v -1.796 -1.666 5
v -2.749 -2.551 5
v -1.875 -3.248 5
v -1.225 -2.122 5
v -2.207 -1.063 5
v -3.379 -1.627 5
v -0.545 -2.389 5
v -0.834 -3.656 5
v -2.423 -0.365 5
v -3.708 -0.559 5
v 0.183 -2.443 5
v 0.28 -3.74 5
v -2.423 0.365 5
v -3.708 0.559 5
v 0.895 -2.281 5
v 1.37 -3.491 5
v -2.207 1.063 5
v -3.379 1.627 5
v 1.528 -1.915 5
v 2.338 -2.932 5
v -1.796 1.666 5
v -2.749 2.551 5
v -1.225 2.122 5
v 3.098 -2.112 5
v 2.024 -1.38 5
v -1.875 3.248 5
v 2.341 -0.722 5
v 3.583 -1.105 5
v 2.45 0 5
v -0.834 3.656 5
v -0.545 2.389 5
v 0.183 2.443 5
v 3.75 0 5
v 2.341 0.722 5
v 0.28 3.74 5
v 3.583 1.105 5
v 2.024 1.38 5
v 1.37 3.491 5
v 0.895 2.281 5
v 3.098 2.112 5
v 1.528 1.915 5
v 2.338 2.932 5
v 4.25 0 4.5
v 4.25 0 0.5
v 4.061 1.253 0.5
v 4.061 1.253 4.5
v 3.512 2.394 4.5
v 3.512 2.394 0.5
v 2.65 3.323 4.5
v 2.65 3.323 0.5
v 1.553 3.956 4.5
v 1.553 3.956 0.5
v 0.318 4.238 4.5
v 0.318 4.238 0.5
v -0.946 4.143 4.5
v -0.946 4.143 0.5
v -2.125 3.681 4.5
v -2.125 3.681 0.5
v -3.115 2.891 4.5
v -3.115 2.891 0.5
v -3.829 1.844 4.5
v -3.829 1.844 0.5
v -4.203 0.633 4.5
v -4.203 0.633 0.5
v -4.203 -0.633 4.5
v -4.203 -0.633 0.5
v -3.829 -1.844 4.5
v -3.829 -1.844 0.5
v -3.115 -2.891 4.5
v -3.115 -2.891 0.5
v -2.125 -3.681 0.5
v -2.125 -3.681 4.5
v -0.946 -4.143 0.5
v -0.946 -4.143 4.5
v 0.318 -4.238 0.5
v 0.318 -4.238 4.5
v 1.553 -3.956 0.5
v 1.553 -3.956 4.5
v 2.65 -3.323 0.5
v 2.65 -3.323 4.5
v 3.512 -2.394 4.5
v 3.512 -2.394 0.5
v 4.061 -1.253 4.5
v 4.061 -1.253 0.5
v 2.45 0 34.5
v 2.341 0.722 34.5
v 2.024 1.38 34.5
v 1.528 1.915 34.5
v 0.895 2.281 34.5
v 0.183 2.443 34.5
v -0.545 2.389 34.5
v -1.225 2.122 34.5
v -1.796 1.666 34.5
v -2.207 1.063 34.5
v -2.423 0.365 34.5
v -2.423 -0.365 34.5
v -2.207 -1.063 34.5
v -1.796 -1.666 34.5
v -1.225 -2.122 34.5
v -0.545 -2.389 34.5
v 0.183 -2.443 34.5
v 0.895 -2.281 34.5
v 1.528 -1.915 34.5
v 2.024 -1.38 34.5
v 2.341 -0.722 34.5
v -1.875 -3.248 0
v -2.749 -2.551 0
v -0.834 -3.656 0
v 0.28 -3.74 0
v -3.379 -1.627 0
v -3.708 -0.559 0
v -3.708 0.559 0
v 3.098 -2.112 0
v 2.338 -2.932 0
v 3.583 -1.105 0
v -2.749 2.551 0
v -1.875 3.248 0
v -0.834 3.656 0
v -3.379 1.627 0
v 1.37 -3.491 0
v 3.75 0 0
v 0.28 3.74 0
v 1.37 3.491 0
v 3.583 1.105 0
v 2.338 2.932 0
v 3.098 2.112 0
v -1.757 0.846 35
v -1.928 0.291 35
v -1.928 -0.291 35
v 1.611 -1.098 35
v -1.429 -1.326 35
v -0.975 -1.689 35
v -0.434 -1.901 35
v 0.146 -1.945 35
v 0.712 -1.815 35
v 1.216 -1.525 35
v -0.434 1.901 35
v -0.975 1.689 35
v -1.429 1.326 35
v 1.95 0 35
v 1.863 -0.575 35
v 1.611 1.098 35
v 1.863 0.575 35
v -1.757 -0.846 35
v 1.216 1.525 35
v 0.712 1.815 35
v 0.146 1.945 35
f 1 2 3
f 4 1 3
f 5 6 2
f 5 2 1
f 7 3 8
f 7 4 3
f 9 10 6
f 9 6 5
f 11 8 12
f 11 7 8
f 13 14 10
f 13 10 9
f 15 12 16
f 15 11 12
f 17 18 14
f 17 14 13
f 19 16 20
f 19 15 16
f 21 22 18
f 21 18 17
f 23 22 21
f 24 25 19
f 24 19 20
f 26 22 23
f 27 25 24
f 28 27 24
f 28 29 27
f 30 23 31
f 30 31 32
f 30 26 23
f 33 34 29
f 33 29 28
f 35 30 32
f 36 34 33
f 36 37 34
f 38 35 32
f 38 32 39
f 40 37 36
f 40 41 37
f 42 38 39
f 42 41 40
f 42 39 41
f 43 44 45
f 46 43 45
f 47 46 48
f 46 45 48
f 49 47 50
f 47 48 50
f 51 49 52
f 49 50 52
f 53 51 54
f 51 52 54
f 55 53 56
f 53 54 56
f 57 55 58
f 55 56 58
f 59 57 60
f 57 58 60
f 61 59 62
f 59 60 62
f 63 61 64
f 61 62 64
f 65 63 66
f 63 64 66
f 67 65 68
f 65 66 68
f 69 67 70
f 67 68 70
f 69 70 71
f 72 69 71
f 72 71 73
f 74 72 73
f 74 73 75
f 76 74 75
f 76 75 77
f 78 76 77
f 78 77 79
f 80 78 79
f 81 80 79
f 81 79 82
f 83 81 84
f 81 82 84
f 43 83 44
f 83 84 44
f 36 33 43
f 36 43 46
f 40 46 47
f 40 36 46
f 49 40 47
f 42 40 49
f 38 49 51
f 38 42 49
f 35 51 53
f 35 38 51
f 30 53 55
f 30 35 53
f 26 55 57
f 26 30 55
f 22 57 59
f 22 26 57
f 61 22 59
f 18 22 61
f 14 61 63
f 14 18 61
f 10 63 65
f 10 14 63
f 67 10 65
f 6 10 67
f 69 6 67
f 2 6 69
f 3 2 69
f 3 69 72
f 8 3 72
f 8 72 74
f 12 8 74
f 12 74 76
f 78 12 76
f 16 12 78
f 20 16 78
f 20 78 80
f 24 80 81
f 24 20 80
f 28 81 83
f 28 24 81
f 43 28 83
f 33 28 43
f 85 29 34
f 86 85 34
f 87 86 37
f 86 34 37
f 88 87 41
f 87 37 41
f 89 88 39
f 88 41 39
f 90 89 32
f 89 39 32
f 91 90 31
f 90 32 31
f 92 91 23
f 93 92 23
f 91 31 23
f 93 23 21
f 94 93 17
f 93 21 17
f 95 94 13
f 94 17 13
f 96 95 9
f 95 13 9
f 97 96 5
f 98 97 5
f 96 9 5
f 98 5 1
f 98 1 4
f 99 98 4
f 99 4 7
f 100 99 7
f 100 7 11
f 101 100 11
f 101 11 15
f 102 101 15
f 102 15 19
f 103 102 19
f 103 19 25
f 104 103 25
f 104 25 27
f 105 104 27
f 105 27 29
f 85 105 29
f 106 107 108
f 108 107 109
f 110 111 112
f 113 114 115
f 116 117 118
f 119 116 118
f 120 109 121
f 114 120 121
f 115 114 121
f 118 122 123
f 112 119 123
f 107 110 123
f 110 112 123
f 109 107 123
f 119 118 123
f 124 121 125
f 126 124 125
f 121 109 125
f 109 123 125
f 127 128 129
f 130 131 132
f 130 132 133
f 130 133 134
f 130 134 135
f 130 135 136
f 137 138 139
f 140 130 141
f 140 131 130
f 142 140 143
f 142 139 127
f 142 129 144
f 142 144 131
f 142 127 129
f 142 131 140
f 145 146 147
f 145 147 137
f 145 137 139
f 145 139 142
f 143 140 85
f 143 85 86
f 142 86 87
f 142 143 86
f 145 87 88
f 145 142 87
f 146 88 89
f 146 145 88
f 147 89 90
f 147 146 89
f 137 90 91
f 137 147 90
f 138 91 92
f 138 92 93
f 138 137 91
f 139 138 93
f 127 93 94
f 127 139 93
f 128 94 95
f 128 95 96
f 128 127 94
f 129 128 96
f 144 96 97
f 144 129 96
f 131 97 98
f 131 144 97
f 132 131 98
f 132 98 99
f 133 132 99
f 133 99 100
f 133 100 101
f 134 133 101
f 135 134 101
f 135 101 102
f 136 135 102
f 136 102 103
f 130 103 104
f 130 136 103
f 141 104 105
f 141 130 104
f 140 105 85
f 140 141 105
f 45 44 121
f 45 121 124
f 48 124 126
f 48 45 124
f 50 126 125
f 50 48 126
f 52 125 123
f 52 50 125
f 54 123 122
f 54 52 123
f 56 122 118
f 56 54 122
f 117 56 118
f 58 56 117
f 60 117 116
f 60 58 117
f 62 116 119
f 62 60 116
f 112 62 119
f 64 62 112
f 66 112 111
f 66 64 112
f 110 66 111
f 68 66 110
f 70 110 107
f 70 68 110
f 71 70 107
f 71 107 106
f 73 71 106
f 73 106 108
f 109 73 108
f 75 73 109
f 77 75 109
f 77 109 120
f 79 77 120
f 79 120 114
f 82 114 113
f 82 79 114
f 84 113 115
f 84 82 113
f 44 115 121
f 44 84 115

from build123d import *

# Parameters (mm, degrees)
SKIZZE1_R                       = 4.25
SKIZZE1_R_2                     = 2.45
AUFSATZ_LINEAR_AUSTRAGEN1_DEPTH = 5
SKIZZE1_3_R                     = 2.45
AUFSATZ_LINEAR_AUSTRAGEN2_DEPTH = 35
FASE1_SIZE                      = 0.5


with BuildPart() as part:
    # Skizze1 → Aufsatz-Linear austragen1 (new body)
    # profile 1 of 2: a face of its own
    with BuildSketch(Plane.XY):
        Circle(SKIZZE1_R)
        Circle(SKIZZE1_R_2, mode=Mode.SUBTRACT)
    # profile 2 of 2: a face of its own
    with BuildSketch(Plane.XY):
        Circle(SKIZZE1_R_2)
    extrude(amount=AUFSATZ_LINEAR_AUSTRAGEN1_DEPTH)

    # Skizze1<3> → Aufsatz-Linear austragen2 (add)
    with BuildSketch(Plane.XY):
        Circle(SKIZZE1_3_R)
    extrude(amount=AUFSATZ_LINEAR_AUSTRAGEN2_DEPTH)

    # Fase1
    fase1_edges = [part.edges().sort_by_distance(p)[0] for p in [
        (-4.25, 0, 0),
        (-4.25, 0, 5),
        (-2.45, 0, 35),
    ]]
    chamfer(fase1_edges, length=FASE1_SIZE)


solid = part.part
